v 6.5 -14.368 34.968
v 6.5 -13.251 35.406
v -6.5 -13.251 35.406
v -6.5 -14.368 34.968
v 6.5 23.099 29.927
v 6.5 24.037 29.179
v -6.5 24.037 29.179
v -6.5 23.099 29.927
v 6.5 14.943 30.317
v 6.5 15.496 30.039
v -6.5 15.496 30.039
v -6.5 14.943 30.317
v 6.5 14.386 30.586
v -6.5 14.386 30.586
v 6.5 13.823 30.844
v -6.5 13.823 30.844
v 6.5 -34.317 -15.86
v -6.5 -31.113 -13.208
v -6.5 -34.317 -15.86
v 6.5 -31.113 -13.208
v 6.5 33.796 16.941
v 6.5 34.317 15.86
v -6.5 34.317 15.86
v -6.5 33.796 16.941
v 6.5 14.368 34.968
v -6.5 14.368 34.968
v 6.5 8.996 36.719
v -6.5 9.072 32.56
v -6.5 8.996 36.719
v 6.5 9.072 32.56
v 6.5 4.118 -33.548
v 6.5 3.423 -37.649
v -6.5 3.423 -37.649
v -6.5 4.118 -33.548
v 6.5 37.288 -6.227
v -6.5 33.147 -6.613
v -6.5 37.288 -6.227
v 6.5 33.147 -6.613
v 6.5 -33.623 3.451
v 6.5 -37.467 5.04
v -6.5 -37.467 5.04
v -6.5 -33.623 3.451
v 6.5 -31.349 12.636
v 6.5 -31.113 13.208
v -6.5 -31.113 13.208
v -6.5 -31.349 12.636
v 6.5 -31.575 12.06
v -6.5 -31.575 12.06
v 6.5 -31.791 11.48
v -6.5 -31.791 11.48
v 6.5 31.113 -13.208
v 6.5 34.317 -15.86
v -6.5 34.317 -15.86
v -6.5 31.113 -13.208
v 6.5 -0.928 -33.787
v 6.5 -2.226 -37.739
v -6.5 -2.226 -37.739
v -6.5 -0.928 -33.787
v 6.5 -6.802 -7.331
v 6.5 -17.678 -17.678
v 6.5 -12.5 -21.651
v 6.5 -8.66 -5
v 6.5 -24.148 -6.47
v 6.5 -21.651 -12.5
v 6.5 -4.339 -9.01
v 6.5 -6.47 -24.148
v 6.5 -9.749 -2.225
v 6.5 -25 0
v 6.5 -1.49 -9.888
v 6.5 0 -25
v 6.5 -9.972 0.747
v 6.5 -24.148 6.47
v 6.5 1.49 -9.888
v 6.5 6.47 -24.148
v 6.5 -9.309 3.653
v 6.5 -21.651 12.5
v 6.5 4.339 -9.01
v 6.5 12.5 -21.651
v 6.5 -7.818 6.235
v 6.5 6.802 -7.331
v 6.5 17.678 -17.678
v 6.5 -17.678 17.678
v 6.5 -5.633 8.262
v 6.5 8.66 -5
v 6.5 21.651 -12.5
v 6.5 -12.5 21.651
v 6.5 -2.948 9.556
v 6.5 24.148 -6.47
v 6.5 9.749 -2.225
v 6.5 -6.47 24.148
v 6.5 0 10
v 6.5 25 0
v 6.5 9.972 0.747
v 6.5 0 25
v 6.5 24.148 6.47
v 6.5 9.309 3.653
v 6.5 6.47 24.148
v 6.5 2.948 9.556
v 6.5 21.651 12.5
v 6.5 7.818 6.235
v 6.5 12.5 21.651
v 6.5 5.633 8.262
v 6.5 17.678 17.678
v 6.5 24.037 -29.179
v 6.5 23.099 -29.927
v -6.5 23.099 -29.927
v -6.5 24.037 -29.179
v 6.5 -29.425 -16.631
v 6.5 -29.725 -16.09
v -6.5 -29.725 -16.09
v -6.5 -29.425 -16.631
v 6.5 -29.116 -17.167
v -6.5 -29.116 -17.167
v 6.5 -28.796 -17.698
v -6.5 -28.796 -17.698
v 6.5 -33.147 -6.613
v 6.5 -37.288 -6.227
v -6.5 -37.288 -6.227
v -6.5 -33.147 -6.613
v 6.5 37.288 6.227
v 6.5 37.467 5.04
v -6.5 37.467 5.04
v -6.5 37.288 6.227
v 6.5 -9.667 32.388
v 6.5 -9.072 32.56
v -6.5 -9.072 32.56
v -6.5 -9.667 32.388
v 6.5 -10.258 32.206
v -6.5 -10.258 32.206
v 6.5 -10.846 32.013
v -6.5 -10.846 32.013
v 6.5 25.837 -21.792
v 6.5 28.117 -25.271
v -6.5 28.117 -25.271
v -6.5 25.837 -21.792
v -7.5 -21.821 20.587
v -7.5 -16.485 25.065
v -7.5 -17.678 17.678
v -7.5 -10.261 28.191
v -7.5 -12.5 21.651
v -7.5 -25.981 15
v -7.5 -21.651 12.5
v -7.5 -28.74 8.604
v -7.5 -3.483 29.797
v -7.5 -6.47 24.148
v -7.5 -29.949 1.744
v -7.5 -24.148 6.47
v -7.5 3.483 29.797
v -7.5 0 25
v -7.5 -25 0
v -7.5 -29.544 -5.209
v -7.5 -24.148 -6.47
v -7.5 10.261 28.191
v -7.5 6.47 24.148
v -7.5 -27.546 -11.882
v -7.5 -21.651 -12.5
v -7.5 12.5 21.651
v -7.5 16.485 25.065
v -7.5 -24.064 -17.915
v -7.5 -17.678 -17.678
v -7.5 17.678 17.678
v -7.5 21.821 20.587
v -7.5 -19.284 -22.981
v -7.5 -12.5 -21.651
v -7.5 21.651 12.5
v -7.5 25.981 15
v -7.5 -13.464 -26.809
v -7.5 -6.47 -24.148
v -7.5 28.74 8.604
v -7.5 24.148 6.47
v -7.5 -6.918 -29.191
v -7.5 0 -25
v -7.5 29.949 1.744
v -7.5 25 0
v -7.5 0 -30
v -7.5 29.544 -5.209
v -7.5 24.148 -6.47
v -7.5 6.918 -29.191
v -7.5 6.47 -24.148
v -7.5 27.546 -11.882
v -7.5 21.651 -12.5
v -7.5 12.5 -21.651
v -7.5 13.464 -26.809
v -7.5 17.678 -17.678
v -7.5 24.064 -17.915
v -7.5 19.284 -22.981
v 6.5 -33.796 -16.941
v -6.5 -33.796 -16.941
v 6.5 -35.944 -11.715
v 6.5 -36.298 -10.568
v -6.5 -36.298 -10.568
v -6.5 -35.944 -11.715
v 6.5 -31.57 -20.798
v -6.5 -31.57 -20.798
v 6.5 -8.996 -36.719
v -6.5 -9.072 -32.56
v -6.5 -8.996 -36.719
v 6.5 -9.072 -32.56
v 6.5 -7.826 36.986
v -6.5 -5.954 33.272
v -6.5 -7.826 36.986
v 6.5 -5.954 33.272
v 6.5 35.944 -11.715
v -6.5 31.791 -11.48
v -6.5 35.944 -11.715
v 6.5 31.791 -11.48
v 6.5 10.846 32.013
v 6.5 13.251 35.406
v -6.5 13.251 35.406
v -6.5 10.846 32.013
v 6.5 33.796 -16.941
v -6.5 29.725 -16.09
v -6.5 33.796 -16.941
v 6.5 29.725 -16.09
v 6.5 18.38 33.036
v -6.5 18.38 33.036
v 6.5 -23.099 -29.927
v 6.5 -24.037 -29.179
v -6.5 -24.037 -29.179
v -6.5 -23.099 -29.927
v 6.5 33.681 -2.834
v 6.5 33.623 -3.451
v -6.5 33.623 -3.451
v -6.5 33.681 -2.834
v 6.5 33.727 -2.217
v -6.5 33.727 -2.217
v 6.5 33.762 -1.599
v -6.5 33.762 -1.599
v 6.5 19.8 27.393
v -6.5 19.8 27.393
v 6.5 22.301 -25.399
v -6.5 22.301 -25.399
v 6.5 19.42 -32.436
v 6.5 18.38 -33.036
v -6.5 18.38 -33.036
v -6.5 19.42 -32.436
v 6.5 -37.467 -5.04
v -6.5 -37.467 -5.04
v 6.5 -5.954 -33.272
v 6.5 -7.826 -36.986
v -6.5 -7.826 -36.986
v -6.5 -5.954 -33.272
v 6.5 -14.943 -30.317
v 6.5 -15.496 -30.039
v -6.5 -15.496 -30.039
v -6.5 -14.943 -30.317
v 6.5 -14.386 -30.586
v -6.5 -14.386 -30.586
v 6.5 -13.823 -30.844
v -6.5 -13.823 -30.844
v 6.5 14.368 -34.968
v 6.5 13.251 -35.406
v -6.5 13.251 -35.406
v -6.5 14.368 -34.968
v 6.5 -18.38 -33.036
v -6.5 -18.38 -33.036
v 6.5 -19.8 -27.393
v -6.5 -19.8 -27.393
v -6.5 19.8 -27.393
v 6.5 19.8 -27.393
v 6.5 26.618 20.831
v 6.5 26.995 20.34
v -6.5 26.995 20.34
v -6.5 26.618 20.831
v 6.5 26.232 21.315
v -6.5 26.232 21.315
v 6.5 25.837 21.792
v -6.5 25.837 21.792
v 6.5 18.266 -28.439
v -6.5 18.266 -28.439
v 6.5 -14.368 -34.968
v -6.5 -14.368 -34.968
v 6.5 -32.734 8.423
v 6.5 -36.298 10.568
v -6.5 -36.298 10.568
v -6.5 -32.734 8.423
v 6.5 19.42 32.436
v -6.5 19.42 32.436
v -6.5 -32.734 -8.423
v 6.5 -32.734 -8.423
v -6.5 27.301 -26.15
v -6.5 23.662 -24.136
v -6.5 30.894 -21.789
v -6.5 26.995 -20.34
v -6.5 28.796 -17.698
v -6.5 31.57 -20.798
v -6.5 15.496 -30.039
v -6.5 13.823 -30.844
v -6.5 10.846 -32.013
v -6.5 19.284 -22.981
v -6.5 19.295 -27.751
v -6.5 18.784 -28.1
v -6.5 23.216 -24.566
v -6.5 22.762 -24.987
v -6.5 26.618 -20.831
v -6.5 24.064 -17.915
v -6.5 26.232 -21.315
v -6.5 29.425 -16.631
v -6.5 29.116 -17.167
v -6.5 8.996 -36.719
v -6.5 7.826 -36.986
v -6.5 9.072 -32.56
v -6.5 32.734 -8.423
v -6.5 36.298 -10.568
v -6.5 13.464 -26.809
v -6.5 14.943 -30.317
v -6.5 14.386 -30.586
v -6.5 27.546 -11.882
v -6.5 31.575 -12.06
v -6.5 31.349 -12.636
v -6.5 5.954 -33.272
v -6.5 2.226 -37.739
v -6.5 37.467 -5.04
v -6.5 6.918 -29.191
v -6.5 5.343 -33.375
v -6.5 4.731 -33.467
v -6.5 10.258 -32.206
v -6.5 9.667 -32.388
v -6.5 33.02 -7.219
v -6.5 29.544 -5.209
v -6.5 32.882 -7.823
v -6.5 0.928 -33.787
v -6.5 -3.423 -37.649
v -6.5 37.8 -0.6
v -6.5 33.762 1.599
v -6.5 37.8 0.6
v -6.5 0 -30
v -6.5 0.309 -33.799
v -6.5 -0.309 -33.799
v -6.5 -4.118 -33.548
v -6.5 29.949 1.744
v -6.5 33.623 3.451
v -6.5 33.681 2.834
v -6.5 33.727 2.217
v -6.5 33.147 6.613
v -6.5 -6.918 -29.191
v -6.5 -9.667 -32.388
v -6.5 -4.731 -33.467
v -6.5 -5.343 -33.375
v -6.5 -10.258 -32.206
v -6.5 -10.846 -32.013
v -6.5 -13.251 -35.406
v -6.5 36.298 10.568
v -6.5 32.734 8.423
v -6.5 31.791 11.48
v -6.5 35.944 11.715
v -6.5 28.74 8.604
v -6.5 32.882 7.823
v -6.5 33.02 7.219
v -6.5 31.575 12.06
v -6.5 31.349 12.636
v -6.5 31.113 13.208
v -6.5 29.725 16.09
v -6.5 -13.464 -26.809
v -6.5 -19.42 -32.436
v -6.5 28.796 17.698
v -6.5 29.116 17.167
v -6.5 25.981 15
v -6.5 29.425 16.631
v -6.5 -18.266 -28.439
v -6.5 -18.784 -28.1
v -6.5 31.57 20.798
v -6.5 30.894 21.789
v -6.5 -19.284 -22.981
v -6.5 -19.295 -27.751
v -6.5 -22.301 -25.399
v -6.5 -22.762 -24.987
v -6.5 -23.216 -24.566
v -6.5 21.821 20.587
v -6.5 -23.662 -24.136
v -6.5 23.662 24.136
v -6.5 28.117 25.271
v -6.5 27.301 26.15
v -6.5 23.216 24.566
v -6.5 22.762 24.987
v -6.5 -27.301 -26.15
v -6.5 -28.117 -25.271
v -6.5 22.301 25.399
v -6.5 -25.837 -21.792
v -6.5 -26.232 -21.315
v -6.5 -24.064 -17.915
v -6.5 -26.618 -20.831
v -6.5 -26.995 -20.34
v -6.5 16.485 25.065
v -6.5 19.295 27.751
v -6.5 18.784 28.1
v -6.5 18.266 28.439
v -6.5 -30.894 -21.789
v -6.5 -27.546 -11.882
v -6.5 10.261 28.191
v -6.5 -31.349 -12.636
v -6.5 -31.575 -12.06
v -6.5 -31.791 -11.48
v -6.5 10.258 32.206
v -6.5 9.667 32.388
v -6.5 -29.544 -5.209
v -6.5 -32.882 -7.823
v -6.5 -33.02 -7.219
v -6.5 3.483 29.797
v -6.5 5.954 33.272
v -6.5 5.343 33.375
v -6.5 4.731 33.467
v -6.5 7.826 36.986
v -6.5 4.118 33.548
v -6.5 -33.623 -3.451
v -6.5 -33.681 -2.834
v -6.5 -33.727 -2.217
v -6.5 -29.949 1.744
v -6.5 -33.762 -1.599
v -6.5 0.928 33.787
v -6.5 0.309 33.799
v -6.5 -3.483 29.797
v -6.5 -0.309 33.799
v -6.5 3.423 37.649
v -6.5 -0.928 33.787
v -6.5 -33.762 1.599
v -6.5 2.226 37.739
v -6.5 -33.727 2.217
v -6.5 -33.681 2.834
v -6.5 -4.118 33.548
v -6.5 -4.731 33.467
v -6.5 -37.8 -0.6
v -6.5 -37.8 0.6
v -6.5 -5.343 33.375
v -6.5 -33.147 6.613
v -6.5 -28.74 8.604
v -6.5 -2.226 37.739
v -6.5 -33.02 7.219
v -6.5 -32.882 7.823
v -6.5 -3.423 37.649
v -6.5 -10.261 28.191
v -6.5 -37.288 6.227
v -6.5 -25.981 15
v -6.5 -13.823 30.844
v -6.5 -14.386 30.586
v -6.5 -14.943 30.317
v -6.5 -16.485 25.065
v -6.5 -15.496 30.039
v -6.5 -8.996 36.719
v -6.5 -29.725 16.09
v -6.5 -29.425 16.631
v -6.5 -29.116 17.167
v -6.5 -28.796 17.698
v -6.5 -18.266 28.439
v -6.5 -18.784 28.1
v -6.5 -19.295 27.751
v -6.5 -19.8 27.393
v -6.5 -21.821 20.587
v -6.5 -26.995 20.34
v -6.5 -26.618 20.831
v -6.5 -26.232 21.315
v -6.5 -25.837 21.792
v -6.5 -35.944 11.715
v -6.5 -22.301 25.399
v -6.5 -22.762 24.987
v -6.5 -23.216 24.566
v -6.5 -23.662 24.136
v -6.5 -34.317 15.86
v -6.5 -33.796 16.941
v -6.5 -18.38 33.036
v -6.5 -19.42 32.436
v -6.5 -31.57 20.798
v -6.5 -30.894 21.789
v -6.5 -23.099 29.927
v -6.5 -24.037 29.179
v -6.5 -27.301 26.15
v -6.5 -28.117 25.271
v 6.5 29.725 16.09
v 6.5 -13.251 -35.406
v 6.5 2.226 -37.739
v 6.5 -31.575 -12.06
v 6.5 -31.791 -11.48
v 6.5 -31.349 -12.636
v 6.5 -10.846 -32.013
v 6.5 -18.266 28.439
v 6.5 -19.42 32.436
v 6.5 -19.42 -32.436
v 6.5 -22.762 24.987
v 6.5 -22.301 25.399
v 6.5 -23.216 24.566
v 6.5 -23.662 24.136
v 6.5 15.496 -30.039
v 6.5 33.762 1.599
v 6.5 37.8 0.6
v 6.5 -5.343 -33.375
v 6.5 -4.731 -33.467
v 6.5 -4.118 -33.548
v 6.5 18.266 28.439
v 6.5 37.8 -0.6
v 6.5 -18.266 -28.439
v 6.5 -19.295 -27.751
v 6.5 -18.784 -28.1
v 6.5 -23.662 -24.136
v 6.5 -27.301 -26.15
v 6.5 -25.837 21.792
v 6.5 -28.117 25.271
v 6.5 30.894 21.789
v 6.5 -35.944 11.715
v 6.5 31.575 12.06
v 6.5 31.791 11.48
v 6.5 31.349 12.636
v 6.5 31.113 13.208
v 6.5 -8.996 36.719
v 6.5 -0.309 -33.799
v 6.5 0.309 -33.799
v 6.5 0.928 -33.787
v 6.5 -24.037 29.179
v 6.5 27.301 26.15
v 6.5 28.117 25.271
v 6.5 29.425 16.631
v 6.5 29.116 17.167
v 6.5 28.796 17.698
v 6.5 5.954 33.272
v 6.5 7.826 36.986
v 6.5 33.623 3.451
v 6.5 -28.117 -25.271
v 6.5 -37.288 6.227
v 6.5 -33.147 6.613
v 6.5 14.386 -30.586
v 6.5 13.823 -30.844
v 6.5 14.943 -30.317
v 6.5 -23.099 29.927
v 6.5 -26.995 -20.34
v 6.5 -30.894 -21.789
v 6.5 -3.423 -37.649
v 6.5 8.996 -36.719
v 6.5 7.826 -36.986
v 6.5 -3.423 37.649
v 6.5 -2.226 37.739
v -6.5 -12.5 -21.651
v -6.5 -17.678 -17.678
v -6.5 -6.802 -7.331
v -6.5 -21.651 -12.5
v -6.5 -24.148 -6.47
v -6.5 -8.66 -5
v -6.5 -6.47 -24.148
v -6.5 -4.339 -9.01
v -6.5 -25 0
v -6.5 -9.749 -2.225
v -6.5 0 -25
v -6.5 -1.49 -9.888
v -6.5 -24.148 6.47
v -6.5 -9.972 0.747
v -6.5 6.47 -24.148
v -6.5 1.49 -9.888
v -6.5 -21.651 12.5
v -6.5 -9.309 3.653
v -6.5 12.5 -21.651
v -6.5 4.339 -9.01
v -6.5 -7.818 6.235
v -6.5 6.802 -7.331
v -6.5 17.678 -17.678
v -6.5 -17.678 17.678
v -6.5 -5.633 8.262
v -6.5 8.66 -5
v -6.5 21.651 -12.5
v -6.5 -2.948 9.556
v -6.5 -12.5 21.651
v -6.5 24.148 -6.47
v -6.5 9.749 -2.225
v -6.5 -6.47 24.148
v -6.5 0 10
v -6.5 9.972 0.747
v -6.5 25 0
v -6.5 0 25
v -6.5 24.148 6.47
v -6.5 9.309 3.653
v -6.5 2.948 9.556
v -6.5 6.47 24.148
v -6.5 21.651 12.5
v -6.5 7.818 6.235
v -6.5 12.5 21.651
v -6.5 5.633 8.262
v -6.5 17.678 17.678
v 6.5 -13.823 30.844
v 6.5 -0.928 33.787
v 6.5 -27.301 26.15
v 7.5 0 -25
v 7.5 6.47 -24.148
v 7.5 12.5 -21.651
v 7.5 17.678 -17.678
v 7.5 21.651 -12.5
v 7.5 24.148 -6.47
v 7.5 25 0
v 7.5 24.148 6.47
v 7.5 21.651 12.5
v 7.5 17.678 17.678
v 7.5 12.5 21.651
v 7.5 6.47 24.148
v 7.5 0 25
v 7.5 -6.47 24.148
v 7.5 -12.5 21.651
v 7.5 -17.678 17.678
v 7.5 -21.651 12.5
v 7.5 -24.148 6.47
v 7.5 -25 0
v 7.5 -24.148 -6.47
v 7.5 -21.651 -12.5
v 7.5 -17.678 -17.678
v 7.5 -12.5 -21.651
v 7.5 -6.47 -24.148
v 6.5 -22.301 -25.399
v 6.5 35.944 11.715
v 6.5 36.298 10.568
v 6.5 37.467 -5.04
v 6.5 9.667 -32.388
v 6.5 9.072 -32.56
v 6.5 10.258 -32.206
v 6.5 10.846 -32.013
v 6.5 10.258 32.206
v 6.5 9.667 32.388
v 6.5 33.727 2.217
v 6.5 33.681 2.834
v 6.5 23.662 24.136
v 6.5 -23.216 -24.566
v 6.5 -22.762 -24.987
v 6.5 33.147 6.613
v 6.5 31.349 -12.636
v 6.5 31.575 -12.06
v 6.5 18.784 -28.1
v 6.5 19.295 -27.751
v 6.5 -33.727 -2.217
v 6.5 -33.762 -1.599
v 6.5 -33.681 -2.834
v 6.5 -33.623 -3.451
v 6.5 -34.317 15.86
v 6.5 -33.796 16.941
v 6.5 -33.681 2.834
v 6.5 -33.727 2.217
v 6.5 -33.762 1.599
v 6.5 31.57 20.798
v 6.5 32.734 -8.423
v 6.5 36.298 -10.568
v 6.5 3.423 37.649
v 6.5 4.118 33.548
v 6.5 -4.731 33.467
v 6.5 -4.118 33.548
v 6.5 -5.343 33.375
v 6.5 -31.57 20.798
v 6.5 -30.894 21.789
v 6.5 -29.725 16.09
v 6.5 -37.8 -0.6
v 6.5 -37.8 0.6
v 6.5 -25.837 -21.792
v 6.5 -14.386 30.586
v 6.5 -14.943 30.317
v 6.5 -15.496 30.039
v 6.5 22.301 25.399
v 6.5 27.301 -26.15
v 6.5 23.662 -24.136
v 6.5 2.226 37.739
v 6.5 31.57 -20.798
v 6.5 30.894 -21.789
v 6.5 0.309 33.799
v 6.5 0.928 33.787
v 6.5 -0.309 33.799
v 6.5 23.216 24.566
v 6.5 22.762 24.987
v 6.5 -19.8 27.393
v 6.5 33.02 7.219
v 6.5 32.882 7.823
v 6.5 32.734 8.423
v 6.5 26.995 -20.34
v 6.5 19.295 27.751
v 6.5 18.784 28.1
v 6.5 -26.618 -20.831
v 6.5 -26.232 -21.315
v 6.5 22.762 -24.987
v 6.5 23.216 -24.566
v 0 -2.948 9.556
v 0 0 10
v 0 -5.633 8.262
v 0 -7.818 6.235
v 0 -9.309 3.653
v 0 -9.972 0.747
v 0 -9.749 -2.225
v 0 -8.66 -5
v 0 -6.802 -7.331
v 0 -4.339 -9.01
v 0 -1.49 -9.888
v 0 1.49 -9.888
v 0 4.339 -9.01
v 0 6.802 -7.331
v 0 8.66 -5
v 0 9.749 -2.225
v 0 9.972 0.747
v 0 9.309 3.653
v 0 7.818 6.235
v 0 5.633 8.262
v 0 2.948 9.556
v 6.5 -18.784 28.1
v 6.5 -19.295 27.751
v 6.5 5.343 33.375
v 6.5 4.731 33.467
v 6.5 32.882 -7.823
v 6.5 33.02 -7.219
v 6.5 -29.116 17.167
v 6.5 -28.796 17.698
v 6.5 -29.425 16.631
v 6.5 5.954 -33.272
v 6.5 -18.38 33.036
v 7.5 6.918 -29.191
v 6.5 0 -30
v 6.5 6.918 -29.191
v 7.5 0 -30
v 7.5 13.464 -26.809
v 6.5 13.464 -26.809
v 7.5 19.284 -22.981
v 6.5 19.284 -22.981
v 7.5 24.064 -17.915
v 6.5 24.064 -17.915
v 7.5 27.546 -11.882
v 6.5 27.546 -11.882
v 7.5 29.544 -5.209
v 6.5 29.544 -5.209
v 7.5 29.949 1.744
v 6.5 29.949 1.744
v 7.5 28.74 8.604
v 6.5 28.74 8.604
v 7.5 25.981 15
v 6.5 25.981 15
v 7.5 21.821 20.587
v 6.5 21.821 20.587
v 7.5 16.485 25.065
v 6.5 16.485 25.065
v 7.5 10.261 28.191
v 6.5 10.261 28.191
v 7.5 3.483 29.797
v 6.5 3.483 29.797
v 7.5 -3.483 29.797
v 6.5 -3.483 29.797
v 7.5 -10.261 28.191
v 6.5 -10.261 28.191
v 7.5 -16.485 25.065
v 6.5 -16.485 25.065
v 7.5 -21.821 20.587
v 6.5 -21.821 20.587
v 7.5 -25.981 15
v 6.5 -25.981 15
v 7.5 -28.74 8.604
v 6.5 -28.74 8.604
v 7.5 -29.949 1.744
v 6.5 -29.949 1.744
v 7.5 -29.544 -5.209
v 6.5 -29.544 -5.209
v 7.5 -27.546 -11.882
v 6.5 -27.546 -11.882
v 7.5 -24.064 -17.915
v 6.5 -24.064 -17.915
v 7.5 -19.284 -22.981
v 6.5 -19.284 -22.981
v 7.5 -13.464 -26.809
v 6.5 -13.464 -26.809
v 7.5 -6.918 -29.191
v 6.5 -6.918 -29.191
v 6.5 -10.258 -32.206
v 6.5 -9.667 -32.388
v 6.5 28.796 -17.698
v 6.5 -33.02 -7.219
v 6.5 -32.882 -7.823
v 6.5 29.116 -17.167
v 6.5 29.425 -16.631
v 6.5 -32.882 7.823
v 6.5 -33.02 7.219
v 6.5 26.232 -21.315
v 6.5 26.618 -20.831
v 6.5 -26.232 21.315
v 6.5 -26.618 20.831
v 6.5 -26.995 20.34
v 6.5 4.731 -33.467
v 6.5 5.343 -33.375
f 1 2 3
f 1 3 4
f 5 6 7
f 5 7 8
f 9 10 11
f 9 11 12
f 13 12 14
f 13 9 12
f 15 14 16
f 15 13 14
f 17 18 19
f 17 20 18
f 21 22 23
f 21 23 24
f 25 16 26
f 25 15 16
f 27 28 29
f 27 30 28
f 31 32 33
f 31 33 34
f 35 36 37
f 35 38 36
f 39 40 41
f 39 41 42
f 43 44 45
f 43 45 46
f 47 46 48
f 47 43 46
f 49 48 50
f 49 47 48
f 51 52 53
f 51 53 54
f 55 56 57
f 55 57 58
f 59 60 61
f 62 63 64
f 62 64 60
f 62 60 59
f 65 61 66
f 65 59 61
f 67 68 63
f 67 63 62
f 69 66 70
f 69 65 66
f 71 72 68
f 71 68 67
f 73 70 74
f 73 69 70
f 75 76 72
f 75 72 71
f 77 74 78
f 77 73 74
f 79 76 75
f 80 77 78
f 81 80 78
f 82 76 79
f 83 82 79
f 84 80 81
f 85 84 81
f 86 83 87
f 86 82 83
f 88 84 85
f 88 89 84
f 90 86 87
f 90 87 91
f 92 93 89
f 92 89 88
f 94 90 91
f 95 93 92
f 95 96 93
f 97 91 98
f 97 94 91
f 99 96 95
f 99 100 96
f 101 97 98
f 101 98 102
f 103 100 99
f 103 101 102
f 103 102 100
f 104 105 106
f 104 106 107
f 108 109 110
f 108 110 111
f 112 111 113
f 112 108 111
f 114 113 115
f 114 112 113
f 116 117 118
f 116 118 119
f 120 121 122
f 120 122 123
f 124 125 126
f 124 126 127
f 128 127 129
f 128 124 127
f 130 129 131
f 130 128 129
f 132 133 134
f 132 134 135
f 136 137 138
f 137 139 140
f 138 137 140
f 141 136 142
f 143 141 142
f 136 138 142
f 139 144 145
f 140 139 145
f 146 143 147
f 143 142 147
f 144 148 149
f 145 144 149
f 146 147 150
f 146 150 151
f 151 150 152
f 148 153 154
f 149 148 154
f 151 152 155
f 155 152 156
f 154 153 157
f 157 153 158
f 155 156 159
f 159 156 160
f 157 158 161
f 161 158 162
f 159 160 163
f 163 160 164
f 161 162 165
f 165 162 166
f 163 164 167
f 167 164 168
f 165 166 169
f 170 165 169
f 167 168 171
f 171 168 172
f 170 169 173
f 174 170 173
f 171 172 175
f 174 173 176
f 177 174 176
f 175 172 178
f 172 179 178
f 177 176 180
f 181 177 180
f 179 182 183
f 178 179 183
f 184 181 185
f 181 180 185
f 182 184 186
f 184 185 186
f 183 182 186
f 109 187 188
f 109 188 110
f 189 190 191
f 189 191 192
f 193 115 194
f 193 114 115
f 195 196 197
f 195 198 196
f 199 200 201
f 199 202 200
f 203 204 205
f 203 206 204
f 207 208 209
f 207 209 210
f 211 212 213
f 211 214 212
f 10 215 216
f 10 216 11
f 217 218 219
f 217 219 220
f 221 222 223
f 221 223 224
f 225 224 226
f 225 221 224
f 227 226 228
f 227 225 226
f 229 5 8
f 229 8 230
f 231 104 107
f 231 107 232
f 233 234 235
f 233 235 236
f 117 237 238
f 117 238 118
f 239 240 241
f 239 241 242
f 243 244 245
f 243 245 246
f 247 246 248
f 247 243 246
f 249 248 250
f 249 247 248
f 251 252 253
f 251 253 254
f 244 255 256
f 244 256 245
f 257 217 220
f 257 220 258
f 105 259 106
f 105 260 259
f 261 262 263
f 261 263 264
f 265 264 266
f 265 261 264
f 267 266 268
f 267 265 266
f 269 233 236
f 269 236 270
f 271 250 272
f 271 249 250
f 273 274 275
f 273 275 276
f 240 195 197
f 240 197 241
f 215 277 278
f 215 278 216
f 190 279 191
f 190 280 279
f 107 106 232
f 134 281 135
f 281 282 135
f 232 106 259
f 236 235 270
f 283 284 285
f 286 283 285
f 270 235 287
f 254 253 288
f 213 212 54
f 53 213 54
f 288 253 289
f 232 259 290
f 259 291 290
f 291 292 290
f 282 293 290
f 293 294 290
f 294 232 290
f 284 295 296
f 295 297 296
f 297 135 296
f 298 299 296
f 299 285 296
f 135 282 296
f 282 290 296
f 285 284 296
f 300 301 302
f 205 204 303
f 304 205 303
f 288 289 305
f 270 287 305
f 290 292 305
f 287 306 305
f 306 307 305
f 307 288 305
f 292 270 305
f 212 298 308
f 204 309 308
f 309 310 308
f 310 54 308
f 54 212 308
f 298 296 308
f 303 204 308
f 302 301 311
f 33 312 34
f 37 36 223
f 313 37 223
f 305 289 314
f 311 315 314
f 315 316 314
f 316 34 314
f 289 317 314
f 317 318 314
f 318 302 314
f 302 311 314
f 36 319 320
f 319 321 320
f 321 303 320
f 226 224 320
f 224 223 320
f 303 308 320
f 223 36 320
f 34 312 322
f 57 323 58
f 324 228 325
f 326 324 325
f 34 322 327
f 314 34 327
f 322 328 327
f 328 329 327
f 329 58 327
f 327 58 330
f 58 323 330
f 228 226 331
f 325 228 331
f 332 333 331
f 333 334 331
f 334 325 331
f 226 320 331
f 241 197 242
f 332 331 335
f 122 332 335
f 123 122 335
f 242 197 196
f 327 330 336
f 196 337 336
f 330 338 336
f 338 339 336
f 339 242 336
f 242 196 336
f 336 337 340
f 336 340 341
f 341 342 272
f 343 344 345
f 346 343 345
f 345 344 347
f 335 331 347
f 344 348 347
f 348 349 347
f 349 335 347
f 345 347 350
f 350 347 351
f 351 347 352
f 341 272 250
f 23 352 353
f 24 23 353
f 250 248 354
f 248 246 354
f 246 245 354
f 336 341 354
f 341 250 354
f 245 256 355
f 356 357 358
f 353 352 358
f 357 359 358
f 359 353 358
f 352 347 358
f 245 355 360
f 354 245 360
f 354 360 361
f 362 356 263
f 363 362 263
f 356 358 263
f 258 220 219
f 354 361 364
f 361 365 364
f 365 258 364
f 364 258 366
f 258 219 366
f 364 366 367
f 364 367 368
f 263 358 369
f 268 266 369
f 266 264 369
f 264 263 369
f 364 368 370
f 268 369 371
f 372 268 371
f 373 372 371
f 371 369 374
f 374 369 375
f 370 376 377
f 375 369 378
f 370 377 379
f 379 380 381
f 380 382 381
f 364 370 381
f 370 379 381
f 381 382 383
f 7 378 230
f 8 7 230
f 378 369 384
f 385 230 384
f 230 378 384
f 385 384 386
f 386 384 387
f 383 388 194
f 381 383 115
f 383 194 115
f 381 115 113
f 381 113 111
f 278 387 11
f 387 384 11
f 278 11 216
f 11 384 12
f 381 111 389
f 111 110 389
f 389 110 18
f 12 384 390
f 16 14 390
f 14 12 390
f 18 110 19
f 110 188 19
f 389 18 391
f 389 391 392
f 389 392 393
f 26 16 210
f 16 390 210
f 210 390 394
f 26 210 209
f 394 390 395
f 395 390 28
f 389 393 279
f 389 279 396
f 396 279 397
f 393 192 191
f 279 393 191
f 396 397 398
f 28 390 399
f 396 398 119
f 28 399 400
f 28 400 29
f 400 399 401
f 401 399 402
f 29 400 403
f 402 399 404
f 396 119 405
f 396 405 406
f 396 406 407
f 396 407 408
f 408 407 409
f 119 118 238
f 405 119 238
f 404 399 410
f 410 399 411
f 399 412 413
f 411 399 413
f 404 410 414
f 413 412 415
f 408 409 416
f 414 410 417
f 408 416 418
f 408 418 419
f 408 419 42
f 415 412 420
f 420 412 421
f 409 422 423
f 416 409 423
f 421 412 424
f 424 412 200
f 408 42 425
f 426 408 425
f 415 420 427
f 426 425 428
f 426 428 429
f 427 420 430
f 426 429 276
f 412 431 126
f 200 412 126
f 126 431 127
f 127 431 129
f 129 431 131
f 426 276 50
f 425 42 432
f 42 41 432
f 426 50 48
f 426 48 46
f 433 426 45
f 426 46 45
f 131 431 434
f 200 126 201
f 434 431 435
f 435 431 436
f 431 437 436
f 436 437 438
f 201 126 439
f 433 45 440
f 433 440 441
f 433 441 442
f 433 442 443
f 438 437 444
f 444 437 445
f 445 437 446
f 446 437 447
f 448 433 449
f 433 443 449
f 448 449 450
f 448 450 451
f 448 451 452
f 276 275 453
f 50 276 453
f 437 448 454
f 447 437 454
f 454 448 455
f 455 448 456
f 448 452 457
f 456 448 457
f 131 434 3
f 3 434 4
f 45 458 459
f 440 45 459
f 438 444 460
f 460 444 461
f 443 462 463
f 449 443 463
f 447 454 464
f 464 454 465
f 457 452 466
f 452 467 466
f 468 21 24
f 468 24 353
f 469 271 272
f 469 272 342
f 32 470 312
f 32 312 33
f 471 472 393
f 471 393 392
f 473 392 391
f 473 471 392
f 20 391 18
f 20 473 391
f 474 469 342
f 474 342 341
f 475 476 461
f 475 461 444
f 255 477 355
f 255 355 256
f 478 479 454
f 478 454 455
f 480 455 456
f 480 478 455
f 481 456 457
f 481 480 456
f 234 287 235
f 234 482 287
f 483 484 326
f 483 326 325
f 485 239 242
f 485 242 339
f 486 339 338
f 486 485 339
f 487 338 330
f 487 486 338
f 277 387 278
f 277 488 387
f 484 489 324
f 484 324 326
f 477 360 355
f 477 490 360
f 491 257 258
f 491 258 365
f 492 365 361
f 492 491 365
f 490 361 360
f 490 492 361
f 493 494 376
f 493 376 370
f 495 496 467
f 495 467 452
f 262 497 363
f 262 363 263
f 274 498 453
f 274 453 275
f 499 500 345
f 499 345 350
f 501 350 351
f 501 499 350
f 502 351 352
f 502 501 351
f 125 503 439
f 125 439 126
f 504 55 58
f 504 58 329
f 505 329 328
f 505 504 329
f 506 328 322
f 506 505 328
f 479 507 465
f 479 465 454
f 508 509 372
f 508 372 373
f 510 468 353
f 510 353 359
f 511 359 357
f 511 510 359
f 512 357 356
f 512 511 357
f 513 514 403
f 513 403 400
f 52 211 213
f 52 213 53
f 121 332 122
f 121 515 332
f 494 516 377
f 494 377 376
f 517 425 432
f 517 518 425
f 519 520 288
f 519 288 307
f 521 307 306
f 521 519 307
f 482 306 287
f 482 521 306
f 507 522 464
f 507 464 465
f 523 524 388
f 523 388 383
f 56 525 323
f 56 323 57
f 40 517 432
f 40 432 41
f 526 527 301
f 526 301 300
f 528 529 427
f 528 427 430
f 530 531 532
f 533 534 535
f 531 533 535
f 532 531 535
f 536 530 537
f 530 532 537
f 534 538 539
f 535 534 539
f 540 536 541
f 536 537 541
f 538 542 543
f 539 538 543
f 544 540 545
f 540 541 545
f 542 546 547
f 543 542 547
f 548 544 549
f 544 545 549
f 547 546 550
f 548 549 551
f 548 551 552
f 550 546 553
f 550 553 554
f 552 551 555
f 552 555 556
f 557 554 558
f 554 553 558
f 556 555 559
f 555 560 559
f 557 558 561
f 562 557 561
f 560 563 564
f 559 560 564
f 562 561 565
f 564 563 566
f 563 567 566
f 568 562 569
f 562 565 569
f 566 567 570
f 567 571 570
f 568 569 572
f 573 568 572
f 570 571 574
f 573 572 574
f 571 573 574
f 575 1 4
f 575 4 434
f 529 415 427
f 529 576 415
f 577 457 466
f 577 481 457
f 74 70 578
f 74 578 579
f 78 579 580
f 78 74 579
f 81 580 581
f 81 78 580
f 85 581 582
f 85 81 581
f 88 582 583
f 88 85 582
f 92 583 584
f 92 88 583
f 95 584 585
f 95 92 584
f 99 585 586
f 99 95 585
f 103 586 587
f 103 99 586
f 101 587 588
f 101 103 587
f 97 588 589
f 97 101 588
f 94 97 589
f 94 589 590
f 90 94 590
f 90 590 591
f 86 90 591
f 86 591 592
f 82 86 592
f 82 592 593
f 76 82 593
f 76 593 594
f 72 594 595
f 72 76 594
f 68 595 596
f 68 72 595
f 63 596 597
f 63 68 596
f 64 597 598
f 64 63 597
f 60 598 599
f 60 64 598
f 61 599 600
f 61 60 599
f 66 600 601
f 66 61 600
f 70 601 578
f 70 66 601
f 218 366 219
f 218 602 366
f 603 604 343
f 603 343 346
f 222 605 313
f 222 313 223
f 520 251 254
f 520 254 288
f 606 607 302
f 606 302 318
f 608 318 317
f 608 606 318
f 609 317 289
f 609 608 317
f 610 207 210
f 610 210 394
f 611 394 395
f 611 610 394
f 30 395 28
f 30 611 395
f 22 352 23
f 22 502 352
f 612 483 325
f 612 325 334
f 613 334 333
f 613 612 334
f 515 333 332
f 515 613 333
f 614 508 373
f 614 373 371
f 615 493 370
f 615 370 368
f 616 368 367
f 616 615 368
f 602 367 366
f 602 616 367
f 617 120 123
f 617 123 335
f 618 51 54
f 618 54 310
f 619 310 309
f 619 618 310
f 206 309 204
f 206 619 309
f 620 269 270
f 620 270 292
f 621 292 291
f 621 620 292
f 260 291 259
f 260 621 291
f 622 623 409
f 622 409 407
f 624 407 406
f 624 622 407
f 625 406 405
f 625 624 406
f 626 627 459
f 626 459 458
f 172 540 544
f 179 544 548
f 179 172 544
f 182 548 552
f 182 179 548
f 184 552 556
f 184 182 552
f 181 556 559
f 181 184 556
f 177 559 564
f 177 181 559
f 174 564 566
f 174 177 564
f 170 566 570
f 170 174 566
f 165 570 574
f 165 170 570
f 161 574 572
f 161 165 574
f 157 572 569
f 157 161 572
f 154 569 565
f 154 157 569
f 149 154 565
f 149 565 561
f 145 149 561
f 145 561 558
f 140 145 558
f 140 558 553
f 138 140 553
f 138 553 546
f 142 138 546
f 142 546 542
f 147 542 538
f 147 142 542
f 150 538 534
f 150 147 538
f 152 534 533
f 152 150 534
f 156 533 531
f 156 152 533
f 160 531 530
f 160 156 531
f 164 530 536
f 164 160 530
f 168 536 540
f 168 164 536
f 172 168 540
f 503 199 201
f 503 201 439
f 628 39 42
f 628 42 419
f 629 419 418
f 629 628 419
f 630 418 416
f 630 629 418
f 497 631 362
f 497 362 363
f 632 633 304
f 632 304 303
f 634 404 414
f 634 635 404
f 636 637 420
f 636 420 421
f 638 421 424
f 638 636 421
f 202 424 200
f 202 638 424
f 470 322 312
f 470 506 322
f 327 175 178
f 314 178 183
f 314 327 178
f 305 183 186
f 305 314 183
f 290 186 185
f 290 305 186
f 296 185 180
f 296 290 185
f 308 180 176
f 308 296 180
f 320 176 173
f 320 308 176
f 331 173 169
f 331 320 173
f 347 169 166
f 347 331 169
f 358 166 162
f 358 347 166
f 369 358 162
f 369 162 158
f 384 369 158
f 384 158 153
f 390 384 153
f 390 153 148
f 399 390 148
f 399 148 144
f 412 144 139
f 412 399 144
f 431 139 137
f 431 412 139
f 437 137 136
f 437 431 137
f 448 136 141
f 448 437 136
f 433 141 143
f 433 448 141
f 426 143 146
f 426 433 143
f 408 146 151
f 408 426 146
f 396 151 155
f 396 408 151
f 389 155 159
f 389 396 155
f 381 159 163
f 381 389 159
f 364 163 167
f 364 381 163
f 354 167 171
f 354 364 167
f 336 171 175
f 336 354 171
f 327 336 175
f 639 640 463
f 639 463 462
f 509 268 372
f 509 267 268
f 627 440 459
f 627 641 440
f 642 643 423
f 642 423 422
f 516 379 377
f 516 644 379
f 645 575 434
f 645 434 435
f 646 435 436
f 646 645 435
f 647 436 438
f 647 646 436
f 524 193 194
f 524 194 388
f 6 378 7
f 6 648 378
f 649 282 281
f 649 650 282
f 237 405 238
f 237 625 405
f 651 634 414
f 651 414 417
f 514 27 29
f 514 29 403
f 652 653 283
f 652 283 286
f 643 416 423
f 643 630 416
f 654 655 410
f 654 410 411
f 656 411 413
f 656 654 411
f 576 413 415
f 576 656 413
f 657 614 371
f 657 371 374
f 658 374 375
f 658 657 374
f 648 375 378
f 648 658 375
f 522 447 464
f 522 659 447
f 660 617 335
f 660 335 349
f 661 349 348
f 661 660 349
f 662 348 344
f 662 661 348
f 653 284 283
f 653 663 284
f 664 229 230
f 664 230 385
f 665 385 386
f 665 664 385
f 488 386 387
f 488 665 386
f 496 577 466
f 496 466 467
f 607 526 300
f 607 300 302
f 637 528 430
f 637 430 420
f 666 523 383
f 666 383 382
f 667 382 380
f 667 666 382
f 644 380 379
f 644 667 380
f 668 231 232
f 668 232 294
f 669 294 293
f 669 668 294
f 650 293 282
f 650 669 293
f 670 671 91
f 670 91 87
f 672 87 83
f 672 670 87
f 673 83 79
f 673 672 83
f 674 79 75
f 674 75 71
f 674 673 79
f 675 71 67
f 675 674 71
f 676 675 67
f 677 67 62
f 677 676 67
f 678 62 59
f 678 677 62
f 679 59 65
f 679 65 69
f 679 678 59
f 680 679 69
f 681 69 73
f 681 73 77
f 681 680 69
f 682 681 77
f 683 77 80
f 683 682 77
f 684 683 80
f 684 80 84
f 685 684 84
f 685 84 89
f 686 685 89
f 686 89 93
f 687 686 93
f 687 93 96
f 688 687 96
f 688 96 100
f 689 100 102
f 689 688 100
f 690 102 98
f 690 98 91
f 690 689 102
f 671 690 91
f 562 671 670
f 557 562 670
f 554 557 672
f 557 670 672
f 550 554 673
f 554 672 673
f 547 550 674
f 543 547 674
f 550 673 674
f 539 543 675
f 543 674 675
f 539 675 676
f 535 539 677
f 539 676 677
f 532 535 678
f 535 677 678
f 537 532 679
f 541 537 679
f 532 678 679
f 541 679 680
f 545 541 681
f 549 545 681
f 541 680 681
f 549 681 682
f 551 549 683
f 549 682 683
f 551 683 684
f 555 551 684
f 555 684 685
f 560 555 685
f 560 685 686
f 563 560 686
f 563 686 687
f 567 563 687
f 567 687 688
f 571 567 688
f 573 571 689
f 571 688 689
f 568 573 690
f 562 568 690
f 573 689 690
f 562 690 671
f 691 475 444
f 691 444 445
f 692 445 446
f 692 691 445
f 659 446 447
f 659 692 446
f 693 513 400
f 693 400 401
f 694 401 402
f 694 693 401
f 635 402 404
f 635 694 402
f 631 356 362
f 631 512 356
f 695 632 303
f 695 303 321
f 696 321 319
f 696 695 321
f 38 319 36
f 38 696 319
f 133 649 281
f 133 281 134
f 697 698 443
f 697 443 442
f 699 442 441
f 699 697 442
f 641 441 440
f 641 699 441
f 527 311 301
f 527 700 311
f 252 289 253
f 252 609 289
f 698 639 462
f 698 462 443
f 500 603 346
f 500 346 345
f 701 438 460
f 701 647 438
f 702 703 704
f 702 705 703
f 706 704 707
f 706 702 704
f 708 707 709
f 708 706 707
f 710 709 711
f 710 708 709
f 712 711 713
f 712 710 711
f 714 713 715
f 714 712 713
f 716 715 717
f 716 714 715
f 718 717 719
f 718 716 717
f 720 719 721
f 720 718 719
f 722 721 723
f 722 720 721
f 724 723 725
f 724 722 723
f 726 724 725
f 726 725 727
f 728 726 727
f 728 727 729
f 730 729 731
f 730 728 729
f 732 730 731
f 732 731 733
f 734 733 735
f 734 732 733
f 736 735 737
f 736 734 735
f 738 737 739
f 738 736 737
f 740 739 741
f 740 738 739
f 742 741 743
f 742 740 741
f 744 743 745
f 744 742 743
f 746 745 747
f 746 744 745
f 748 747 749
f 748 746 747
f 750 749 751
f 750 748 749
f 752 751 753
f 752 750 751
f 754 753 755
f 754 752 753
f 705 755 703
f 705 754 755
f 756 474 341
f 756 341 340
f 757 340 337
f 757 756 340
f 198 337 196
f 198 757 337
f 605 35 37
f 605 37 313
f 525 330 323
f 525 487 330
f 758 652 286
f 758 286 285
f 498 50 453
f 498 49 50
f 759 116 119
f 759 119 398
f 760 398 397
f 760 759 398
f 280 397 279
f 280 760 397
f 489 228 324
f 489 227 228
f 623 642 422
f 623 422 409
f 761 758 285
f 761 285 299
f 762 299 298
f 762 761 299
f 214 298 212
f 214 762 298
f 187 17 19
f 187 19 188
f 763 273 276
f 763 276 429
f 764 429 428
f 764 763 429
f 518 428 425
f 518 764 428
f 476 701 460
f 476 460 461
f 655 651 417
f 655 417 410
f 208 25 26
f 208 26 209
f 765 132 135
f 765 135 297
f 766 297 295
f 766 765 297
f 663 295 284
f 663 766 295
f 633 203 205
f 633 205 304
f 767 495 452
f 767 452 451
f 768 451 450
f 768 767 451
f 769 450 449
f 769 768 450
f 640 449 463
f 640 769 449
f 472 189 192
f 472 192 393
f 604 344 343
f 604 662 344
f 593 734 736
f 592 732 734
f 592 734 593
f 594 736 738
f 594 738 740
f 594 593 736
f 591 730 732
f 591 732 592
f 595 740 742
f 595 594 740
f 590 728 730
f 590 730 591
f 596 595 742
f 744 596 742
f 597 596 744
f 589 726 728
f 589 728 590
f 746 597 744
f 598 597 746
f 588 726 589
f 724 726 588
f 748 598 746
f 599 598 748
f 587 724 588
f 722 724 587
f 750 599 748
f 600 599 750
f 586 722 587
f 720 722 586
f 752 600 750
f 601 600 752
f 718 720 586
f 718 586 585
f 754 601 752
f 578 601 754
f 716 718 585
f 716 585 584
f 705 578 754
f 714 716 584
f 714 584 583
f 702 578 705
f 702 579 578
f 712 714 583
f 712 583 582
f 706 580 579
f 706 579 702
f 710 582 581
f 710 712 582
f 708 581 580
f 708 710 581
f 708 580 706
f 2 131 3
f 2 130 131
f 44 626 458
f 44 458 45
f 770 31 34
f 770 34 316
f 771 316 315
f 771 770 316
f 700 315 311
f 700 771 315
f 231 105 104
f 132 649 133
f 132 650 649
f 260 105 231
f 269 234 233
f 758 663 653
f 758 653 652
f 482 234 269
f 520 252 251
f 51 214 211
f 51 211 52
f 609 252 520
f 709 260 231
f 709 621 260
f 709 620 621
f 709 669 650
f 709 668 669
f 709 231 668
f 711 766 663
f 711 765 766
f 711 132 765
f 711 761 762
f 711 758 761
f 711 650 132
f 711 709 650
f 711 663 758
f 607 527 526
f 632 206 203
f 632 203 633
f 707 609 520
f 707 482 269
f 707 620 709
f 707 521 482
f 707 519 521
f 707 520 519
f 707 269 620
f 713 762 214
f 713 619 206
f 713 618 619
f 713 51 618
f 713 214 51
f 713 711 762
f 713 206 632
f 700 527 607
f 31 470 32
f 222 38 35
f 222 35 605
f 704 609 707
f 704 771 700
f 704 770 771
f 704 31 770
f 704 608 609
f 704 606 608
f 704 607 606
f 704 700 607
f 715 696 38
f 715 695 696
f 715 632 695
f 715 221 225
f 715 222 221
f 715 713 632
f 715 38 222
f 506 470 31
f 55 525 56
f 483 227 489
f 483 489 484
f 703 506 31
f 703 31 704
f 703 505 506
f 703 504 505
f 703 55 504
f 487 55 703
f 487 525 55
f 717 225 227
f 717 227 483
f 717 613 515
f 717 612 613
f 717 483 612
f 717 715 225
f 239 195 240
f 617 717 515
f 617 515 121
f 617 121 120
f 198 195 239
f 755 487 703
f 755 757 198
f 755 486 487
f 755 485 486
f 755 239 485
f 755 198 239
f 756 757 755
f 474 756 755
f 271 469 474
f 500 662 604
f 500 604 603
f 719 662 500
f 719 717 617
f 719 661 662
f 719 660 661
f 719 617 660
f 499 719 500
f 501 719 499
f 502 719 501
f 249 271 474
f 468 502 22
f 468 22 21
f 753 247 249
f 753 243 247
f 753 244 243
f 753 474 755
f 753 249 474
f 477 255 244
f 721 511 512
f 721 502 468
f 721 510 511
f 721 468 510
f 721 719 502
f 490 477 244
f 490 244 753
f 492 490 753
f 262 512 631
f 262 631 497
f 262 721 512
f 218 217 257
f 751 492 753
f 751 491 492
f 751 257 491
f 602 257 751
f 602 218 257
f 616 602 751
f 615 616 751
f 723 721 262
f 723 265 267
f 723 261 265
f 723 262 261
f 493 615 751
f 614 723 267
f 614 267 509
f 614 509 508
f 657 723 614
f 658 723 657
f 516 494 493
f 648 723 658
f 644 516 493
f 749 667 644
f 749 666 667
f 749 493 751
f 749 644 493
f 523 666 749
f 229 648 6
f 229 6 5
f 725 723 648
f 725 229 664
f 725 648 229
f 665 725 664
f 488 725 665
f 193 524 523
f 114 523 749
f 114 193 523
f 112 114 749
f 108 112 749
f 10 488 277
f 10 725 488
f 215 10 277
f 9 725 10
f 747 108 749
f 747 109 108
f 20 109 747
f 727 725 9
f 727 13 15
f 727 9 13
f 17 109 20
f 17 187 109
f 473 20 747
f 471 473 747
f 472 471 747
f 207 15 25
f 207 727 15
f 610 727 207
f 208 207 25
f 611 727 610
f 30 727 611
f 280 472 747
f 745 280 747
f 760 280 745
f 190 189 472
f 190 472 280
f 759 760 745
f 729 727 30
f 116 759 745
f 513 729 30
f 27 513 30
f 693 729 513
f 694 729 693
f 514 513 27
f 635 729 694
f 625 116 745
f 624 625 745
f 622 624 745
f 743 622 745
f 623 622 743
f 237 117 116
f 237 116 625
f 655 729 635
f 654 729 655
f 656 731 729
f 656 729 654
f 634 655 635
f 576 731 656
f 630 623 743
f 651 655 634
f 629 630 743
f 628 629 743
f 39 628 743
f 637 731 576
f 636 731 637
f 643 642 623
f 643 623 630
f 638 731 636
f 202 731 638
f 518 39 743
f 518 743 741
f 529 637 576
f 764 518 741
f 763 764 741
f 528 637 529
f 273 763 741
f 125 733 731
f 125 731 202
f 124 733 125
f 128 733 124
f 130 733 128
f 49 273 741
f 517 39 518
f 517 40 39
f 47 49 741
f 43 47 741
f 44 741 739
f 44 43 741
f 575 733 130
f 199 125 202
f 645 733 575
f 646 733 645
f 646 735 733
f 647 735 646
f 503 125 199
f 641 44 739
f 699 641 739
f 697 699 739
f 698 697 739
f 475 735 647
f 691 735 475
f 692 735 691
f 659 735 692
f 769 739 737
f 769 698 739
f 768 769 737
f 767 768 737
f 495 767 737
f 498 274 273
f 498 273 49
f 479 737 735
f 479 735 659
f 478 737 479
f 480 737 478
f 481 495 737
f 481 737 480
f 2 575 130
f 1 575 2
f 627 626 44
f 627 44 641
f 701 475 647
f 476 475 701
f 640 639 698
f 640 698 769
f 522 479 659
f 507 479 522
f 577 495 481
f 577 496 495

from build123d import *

# Parameters (mm, degrees)
SKETCH1_R           = 33.8
SKETCH1_R_2         = 10
BOSS_EXTRUDE1_DEPTH = 6.5
SKETCH1_3_R         = 30
SKETCH1_3_R_2       = 25
BOSS_EXTRUDE2_DEPTH = 7.5
BOSS_EXTRUDE3_DEPTH = 6.5
CIRPATTERN1_COUNT   = 42


with BuildPart() as part:
    # Sketch1 → Boss-Extrude1 (new, symmetric)
    with BuildSketch(Plane.YZ):
        Circle(SKETCH1_R)
        Circle(SKETCH1_R_2, mode=Mode.SUBTRACT)
    extrude(amount=BOSS_EXTRUDE1_DEPTH, both=True)

    # Sketch1<3> → Boss-Extrude2 (add, symmetric)
    with BuildSketch(Plane.YZ):
        Circle(SKETCH1_3_R)
        Circle(SKETCH1_3_R_2, mode=Mode.SUBTRACT)
    extrude(amount=BOSS_EXTRUDE2_DEPTH, both=True)

    # Sketch1<4> → Boss-Extrude3 (add, symmetric)
    with BuildSketch(Plane.YZ):
        with BuildLine():
            Line((-33.7621436, 1.599268434), (-37.8, 0.6))
            Line((-37.8, 0.6), (-37.8, -0.6))
            Line((-37.8, -0.6), (-33.7621436, -1.599268434))
            ThreePointArc((-33.7621436, -1.599268434), (-33.8, 0), (-33.7621436, 1.599268434))
        make_face()
    boss_extrude3 = extrude(amount=BOSS_EXTRUDE3_DEPTH, both=True)

    # CirPattern1: Boss-Extrude3 ×42 about axis
    cirpattern1_axis = Axis((6.5, 0, 0), (1, 0, 0))
    for i in range(1, CIRPATTERN1_COUNT):
        add(boss_extrude3.rotate(cirpattern1_axis, i * 360 / CIRPATTERN1_COUNT))


solid = part.part
